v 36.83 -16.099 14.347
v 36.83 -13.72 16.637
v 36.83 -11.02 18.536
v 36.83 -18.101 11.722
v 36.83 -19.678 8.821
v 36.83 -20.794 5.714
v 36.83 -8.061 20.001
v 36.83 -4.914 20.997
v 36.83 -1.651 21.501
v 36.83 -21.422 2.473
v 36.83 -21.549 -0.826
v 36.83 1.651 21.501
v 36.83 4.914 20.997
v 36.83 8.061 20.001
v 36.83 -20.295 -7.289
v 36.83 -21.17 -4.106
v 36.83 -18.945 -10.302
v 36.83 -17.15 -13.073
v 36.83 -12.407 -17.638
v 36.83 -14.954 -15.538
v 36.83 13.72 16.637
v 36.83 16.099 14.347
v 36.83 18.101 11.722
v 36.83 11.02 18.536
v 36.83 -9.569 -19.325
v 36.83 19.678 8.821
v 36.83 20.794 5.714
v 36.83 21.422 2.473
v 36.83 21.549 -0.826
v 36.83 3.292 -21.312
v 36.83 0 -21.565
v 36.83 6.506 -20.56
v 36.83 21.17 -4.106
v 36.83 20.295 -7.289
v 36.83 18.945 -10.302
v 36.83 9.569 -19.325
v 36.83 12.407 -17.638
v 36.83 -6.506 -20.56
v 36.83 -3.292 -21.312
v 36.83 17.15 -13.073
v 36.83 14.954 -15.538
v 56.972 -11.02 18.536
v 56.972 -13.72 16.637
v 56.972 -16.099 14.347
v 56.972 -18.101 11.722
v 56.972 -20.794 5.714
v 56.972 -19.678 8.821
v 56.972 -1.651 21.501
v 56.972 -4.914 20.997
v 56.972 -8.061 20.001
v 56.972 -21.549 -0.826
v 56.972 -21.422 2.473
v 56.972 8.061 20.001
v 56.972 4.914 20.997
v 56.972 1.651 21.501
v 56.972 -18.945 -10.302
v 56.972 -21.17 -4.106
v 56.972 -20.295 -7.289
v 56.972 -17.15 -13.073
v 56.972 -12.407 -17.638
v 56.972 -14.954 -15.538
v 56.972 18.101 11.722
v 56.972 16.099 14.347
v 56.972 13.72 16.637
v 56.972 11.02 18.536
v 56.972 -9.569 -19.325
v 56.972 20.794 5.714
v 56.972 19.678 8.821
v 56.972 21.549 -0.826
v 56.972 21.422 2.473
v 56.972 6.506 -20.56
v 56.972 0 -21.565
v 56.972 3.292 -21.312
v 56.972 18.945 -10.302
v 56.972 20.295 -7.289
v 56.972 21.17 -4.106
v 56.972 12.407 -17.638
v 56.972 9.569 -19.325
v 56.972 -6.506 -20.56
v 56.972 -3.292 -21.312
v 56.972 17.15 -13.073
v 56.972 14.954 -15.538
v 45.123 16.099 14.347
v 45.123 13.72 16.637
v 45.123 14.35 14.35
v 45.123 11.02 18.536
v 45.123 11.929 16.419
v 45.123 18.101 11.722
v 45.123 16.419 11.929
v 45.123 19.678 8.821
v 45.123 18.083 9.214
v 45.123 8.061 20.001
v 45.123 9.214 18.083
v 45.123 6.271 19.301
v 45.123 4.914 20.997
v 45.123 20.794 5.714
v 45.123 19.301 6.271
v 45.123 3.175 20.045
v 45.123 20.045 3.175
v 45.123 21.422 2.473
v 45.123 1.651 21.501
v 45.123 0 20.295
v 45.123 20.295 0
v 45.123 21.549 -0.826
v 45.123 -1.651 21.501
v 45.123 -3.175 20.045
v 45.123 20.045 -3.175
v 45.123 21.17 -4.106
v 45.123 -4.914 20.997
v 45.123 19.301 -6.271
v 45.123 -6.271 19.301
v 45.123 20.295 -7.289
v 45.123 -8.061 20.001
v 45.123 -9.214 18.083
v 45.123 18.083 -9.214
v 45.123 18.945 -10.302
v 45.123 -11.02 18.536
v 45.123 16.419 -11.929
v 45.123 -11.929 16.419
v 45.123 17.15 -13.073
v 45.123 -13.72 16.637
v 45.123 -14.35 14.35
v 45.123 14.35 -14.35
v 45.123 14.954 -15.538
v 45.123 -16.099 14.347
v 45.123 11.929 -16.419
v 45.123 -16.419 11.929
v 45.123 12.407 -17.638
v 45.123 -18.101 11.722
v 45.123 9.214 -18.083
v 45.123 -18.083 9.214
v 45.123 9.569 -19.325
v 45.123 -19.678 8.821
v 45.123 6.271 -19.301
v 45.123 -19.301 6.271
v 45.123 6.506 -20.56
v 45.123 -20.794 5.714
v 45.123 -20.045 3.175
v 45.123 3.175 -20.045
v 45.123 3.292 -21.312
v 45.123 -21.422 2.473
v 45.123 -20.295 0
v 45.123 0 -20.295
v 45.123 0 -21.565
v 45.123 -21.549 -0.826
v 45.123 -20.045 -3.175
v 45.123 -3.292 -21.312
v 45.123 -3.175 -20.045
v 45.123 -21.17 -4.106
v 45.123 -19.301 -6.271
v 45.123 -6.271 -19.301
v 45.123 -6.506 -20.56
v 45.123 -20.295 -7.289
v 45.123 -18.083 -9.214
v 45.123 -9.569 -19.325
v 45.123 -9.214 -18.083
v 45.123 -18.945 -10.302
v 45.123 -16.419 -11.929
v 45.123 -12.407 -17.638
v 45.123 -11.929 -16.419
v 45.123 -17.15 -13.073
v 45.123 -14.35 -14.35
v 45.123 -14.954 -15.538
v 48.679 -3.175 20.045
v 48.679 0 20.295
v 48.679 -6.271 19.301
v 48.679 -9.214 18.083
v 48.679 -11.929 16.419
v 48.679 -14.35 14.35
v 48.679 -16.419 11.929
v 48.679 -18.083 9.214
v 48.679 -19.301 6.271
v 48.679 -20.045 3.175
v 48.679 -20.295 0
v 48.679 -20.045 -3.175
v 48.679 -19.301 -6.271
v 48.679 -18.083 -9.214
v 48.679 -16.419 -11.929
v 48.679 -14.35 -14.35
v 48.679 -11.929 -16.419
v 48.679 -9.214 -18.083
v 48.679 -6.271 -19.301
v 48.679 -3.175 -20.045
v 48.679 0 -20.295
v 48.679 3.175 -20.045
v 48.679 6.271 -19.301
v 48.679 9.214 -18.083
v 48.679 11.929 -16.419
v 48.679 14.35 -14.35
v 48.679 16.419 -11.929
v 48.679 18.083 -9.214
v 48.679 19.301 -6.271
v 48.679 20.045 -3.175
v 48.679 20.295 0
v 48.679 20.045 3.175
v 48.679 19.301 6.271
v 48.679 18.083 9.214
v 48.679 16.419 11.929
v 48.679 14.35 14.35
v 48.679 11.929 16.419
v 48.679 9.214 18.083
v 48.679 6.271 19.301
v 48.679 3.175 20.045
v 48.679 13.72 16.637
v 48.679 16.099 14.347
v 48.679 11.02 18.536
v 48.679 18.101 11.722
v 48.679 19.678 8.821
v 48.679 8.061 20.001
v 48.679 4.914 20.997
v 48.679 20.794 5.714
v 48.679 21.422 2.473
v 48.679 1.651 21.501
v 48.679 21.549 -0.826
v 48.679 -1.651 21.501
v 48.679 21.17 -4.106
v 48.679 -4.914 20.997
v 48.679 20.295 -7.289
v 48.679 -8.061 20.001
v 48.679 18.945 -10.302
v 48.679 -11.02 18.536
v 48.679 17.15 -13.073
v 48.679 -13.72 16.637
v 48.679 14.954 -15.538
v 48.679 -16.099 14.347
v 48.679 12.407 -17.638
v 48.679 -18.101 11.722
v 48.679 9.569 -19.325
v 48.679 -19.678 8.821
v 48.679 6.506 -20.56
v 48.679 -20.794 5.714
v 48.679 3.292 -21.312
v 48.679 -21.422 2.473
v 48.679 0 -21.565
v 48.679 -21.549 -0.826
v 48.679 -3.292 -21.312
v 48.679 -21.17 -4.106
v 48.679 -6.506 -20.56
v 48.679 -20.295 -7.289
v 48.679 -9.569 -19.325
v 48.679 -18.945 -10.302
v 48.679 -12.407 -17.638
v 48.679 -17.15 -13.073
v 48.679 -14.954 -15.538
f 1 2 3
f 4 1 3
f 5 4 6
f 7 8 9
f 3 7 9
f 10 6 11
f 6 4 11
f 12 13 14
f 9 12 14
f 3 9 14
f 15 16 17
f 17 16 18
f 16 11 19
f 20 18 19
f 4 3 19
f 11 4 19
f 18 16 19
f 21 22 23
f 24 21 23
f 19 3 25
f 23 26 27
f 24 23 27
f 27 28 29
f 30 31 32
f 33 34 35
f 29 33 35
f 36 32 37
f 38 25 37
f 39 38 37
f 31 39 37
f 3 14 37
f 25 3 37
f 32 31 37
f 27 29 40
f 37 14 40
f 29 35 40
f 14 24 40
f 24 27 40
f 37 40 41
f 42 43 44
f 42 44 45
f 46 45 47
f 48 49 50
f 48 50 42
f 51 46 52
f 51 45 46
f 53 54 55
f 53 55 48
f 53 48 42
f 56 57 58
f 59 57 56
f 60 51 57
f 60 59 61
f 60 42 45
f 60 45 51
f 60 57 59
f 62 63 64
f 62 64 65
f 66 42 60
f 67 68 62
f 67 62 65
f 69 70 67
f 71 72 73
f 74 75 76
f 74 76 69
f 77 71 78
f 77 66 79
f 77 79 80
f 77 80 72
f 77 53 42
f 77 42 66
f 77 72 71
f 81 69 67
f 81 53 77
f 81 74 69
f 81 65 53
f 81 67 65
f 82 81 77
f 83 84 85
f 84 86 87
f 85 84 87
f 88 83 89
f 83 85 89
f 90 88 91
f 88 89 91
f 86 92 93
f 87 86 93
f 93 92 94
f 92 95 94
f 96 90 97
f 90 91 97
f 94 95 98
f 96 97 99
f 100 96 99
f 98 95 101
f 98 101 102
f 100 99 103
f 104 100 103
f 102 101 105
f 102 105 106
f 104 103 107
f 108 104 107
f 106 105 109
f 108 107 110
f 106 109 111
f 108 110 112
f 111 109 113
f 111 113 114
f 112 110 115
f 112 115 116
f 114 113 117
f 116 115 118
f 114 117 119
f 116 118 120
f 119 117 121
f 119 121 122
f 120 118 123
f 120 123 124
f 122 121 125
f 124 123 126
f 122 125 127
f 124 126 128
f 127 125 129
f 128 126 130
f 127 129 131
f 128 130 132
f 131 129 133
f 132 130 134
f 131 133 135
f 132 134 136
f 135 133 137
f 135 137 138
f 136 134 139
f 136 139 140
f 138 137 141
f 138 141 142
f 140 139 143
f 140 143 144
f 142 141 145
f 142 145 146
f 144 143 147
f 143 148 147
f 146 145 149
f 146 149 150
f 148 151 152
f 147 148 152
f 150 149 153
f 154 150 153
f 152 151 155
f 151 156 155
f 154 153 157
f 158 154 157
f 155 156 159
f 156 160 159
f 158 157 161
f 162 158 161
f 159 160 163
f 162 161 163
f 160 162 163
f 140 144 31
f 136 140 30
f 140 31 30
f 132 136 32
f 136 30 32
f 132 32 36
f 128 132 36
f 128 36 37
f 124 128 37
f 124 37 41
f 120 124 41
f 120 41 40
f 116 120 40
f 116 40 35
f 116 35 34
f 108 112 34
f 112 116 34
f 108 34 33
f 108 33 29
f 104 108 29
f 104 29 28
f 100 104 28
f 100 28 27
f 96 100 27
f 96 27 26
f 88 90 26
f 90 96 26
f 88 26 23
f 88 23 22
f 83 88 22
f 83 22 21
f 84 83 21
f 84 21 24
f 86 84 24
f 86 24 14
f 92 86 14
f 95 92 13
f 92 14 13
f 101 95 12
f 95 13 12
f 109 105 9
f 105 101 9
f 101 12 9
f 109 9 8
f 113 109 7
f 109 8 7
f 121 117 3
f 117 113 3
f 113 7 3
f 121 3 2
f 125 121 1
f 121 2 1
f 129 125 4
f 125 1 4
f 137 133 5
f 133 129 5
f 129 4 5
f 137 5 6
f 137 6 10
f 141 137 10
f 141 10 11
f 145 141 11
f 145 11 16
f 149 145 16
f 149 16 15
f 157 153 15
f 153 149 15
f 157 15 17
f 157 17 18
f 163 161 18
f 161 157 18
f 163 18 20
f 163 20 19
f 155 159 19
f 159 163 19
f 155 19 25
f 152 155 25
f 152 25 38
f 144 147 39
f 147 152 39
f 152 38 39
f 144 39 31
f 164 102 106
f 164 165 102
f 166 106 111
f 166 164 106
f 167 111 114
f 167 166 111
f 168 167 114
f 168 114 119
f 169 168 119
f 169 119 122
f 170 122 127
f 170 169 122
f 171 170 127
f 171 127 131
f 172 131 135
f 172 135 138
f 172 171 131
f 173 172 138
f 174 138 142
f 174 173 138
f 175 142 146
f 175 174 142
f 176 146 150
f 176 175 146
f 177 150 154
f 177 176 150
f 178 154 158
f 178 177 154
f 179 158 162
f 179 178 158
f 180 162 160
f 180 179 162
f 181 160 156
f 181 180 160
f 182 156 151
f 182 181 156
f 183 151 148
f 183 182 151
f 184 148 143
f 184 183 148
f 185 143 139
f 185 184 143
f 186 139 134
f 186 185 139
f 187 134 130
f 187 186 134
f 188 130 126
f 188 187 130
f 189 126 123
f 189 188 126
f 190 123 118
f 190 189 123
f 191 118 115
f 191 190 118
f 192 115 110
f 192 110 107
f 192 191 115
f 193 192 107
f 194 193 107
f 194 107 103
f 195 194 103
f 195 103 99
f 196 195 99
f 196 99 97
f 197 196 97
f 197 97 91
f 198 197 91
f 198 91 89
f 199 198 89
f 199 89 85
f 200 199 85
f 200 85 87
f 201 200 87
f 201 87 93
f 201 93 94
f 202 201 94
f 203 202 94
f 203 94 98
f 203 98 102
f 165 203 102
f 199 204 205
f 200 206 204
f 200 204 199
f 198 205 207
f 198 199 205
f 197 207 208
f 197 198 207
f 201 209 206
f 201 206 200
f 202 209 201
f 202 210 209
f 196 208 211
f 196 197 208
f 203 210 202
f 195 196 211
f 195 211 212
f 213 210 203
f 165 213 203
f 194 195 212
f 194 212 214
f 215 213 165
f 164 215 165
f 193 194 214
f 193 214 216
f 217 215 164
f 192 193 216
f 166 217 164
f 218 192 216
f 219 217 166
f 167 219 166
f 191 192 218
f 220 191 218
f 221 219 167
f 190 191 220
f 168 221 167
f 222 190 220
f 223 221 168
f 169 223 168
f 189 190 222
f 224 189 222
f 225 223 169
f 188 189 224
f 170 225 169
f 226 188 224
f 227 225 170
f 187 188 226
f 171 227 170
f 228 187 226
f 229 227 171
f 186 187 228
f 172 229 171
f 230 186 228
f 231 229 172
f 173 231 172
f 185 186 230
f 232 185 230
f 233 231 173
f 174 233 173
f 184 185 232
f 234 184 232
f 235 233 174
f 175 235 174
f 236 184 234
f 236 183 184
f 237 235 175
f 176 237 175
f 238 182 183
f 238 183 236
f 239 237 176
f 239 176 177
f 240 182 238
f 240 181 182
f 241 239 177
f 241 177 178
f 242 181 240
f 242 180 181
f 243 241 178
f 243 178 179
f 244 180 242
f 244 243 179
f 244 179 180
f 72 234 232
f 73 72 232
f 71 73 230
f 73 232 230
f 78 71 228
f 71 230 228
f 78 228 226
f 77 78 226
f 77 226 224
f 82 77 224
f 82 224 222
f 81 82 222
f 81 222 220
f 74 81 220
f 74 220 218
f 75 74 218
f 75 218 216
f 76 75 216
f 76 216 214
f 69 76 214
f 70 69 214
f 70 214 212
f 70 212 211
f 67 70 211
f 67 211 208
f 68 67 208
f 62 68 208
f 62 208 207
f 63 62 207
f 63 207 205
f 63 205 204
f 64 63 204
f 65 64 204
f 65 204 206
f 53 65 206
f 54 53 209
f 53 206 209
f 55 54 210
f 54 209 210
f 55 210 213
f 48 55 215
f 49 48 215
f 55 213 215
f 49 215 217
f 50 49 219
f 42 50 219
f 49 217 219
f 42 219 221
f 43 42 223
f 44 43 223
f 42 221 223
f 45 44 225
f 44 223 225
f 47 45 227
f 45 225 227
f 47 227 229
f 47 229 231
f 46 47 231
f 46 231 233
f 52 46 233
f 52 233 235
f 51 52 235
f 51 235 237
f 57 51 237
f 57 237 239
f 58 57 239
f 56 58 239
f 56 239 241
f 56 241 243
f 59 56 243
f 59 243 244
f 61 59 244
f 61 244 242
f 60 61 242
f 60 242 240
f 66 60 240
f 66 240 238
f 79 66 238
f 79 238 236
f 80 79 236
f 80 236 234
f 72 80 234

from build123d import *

# Parameters (mm, degrees)
SKETCH8_R           = 21.5646
BOSS_EXTRUDE1_DEPTH = 20.1422
SKETCH9_W           = 3.556
SKETCH9_H           = 1.27


with BuildPart() as part:
    # Sketch8 → Boss-Extrude1 (new body)
    with BuildSketch(Plane(origin=(36.83, 0, 0), x_dir=(0, 0, -1), z_dir=(1, 0, 0))):
        Circle(SKETCH8_R)
    extrude(amount=BOSS_EXTRUDE1_DEPTH)

    # Sketch9 → O-Ring Groove 2-128ish (revolve, cut)
    with BuildSketch(Plane.XY, mode=Mode.PRIVATE) as o_ring_groove_2_128ish_sk:
        with Locations((46.9011, 20.9296)):
            Rectangle(SKETCH9_W, SKETCH9_H)
    revolve(o_ring_groove_2_128ish_sk.sketch.rotate(Axis((-14.406993702, 0, 0), (1, 0, 0)), 90), axis=Axis((-14.406993702, 0, 0), (1, 0, 0)), mode=Mode.SUBTRACT)


solid = part.part
